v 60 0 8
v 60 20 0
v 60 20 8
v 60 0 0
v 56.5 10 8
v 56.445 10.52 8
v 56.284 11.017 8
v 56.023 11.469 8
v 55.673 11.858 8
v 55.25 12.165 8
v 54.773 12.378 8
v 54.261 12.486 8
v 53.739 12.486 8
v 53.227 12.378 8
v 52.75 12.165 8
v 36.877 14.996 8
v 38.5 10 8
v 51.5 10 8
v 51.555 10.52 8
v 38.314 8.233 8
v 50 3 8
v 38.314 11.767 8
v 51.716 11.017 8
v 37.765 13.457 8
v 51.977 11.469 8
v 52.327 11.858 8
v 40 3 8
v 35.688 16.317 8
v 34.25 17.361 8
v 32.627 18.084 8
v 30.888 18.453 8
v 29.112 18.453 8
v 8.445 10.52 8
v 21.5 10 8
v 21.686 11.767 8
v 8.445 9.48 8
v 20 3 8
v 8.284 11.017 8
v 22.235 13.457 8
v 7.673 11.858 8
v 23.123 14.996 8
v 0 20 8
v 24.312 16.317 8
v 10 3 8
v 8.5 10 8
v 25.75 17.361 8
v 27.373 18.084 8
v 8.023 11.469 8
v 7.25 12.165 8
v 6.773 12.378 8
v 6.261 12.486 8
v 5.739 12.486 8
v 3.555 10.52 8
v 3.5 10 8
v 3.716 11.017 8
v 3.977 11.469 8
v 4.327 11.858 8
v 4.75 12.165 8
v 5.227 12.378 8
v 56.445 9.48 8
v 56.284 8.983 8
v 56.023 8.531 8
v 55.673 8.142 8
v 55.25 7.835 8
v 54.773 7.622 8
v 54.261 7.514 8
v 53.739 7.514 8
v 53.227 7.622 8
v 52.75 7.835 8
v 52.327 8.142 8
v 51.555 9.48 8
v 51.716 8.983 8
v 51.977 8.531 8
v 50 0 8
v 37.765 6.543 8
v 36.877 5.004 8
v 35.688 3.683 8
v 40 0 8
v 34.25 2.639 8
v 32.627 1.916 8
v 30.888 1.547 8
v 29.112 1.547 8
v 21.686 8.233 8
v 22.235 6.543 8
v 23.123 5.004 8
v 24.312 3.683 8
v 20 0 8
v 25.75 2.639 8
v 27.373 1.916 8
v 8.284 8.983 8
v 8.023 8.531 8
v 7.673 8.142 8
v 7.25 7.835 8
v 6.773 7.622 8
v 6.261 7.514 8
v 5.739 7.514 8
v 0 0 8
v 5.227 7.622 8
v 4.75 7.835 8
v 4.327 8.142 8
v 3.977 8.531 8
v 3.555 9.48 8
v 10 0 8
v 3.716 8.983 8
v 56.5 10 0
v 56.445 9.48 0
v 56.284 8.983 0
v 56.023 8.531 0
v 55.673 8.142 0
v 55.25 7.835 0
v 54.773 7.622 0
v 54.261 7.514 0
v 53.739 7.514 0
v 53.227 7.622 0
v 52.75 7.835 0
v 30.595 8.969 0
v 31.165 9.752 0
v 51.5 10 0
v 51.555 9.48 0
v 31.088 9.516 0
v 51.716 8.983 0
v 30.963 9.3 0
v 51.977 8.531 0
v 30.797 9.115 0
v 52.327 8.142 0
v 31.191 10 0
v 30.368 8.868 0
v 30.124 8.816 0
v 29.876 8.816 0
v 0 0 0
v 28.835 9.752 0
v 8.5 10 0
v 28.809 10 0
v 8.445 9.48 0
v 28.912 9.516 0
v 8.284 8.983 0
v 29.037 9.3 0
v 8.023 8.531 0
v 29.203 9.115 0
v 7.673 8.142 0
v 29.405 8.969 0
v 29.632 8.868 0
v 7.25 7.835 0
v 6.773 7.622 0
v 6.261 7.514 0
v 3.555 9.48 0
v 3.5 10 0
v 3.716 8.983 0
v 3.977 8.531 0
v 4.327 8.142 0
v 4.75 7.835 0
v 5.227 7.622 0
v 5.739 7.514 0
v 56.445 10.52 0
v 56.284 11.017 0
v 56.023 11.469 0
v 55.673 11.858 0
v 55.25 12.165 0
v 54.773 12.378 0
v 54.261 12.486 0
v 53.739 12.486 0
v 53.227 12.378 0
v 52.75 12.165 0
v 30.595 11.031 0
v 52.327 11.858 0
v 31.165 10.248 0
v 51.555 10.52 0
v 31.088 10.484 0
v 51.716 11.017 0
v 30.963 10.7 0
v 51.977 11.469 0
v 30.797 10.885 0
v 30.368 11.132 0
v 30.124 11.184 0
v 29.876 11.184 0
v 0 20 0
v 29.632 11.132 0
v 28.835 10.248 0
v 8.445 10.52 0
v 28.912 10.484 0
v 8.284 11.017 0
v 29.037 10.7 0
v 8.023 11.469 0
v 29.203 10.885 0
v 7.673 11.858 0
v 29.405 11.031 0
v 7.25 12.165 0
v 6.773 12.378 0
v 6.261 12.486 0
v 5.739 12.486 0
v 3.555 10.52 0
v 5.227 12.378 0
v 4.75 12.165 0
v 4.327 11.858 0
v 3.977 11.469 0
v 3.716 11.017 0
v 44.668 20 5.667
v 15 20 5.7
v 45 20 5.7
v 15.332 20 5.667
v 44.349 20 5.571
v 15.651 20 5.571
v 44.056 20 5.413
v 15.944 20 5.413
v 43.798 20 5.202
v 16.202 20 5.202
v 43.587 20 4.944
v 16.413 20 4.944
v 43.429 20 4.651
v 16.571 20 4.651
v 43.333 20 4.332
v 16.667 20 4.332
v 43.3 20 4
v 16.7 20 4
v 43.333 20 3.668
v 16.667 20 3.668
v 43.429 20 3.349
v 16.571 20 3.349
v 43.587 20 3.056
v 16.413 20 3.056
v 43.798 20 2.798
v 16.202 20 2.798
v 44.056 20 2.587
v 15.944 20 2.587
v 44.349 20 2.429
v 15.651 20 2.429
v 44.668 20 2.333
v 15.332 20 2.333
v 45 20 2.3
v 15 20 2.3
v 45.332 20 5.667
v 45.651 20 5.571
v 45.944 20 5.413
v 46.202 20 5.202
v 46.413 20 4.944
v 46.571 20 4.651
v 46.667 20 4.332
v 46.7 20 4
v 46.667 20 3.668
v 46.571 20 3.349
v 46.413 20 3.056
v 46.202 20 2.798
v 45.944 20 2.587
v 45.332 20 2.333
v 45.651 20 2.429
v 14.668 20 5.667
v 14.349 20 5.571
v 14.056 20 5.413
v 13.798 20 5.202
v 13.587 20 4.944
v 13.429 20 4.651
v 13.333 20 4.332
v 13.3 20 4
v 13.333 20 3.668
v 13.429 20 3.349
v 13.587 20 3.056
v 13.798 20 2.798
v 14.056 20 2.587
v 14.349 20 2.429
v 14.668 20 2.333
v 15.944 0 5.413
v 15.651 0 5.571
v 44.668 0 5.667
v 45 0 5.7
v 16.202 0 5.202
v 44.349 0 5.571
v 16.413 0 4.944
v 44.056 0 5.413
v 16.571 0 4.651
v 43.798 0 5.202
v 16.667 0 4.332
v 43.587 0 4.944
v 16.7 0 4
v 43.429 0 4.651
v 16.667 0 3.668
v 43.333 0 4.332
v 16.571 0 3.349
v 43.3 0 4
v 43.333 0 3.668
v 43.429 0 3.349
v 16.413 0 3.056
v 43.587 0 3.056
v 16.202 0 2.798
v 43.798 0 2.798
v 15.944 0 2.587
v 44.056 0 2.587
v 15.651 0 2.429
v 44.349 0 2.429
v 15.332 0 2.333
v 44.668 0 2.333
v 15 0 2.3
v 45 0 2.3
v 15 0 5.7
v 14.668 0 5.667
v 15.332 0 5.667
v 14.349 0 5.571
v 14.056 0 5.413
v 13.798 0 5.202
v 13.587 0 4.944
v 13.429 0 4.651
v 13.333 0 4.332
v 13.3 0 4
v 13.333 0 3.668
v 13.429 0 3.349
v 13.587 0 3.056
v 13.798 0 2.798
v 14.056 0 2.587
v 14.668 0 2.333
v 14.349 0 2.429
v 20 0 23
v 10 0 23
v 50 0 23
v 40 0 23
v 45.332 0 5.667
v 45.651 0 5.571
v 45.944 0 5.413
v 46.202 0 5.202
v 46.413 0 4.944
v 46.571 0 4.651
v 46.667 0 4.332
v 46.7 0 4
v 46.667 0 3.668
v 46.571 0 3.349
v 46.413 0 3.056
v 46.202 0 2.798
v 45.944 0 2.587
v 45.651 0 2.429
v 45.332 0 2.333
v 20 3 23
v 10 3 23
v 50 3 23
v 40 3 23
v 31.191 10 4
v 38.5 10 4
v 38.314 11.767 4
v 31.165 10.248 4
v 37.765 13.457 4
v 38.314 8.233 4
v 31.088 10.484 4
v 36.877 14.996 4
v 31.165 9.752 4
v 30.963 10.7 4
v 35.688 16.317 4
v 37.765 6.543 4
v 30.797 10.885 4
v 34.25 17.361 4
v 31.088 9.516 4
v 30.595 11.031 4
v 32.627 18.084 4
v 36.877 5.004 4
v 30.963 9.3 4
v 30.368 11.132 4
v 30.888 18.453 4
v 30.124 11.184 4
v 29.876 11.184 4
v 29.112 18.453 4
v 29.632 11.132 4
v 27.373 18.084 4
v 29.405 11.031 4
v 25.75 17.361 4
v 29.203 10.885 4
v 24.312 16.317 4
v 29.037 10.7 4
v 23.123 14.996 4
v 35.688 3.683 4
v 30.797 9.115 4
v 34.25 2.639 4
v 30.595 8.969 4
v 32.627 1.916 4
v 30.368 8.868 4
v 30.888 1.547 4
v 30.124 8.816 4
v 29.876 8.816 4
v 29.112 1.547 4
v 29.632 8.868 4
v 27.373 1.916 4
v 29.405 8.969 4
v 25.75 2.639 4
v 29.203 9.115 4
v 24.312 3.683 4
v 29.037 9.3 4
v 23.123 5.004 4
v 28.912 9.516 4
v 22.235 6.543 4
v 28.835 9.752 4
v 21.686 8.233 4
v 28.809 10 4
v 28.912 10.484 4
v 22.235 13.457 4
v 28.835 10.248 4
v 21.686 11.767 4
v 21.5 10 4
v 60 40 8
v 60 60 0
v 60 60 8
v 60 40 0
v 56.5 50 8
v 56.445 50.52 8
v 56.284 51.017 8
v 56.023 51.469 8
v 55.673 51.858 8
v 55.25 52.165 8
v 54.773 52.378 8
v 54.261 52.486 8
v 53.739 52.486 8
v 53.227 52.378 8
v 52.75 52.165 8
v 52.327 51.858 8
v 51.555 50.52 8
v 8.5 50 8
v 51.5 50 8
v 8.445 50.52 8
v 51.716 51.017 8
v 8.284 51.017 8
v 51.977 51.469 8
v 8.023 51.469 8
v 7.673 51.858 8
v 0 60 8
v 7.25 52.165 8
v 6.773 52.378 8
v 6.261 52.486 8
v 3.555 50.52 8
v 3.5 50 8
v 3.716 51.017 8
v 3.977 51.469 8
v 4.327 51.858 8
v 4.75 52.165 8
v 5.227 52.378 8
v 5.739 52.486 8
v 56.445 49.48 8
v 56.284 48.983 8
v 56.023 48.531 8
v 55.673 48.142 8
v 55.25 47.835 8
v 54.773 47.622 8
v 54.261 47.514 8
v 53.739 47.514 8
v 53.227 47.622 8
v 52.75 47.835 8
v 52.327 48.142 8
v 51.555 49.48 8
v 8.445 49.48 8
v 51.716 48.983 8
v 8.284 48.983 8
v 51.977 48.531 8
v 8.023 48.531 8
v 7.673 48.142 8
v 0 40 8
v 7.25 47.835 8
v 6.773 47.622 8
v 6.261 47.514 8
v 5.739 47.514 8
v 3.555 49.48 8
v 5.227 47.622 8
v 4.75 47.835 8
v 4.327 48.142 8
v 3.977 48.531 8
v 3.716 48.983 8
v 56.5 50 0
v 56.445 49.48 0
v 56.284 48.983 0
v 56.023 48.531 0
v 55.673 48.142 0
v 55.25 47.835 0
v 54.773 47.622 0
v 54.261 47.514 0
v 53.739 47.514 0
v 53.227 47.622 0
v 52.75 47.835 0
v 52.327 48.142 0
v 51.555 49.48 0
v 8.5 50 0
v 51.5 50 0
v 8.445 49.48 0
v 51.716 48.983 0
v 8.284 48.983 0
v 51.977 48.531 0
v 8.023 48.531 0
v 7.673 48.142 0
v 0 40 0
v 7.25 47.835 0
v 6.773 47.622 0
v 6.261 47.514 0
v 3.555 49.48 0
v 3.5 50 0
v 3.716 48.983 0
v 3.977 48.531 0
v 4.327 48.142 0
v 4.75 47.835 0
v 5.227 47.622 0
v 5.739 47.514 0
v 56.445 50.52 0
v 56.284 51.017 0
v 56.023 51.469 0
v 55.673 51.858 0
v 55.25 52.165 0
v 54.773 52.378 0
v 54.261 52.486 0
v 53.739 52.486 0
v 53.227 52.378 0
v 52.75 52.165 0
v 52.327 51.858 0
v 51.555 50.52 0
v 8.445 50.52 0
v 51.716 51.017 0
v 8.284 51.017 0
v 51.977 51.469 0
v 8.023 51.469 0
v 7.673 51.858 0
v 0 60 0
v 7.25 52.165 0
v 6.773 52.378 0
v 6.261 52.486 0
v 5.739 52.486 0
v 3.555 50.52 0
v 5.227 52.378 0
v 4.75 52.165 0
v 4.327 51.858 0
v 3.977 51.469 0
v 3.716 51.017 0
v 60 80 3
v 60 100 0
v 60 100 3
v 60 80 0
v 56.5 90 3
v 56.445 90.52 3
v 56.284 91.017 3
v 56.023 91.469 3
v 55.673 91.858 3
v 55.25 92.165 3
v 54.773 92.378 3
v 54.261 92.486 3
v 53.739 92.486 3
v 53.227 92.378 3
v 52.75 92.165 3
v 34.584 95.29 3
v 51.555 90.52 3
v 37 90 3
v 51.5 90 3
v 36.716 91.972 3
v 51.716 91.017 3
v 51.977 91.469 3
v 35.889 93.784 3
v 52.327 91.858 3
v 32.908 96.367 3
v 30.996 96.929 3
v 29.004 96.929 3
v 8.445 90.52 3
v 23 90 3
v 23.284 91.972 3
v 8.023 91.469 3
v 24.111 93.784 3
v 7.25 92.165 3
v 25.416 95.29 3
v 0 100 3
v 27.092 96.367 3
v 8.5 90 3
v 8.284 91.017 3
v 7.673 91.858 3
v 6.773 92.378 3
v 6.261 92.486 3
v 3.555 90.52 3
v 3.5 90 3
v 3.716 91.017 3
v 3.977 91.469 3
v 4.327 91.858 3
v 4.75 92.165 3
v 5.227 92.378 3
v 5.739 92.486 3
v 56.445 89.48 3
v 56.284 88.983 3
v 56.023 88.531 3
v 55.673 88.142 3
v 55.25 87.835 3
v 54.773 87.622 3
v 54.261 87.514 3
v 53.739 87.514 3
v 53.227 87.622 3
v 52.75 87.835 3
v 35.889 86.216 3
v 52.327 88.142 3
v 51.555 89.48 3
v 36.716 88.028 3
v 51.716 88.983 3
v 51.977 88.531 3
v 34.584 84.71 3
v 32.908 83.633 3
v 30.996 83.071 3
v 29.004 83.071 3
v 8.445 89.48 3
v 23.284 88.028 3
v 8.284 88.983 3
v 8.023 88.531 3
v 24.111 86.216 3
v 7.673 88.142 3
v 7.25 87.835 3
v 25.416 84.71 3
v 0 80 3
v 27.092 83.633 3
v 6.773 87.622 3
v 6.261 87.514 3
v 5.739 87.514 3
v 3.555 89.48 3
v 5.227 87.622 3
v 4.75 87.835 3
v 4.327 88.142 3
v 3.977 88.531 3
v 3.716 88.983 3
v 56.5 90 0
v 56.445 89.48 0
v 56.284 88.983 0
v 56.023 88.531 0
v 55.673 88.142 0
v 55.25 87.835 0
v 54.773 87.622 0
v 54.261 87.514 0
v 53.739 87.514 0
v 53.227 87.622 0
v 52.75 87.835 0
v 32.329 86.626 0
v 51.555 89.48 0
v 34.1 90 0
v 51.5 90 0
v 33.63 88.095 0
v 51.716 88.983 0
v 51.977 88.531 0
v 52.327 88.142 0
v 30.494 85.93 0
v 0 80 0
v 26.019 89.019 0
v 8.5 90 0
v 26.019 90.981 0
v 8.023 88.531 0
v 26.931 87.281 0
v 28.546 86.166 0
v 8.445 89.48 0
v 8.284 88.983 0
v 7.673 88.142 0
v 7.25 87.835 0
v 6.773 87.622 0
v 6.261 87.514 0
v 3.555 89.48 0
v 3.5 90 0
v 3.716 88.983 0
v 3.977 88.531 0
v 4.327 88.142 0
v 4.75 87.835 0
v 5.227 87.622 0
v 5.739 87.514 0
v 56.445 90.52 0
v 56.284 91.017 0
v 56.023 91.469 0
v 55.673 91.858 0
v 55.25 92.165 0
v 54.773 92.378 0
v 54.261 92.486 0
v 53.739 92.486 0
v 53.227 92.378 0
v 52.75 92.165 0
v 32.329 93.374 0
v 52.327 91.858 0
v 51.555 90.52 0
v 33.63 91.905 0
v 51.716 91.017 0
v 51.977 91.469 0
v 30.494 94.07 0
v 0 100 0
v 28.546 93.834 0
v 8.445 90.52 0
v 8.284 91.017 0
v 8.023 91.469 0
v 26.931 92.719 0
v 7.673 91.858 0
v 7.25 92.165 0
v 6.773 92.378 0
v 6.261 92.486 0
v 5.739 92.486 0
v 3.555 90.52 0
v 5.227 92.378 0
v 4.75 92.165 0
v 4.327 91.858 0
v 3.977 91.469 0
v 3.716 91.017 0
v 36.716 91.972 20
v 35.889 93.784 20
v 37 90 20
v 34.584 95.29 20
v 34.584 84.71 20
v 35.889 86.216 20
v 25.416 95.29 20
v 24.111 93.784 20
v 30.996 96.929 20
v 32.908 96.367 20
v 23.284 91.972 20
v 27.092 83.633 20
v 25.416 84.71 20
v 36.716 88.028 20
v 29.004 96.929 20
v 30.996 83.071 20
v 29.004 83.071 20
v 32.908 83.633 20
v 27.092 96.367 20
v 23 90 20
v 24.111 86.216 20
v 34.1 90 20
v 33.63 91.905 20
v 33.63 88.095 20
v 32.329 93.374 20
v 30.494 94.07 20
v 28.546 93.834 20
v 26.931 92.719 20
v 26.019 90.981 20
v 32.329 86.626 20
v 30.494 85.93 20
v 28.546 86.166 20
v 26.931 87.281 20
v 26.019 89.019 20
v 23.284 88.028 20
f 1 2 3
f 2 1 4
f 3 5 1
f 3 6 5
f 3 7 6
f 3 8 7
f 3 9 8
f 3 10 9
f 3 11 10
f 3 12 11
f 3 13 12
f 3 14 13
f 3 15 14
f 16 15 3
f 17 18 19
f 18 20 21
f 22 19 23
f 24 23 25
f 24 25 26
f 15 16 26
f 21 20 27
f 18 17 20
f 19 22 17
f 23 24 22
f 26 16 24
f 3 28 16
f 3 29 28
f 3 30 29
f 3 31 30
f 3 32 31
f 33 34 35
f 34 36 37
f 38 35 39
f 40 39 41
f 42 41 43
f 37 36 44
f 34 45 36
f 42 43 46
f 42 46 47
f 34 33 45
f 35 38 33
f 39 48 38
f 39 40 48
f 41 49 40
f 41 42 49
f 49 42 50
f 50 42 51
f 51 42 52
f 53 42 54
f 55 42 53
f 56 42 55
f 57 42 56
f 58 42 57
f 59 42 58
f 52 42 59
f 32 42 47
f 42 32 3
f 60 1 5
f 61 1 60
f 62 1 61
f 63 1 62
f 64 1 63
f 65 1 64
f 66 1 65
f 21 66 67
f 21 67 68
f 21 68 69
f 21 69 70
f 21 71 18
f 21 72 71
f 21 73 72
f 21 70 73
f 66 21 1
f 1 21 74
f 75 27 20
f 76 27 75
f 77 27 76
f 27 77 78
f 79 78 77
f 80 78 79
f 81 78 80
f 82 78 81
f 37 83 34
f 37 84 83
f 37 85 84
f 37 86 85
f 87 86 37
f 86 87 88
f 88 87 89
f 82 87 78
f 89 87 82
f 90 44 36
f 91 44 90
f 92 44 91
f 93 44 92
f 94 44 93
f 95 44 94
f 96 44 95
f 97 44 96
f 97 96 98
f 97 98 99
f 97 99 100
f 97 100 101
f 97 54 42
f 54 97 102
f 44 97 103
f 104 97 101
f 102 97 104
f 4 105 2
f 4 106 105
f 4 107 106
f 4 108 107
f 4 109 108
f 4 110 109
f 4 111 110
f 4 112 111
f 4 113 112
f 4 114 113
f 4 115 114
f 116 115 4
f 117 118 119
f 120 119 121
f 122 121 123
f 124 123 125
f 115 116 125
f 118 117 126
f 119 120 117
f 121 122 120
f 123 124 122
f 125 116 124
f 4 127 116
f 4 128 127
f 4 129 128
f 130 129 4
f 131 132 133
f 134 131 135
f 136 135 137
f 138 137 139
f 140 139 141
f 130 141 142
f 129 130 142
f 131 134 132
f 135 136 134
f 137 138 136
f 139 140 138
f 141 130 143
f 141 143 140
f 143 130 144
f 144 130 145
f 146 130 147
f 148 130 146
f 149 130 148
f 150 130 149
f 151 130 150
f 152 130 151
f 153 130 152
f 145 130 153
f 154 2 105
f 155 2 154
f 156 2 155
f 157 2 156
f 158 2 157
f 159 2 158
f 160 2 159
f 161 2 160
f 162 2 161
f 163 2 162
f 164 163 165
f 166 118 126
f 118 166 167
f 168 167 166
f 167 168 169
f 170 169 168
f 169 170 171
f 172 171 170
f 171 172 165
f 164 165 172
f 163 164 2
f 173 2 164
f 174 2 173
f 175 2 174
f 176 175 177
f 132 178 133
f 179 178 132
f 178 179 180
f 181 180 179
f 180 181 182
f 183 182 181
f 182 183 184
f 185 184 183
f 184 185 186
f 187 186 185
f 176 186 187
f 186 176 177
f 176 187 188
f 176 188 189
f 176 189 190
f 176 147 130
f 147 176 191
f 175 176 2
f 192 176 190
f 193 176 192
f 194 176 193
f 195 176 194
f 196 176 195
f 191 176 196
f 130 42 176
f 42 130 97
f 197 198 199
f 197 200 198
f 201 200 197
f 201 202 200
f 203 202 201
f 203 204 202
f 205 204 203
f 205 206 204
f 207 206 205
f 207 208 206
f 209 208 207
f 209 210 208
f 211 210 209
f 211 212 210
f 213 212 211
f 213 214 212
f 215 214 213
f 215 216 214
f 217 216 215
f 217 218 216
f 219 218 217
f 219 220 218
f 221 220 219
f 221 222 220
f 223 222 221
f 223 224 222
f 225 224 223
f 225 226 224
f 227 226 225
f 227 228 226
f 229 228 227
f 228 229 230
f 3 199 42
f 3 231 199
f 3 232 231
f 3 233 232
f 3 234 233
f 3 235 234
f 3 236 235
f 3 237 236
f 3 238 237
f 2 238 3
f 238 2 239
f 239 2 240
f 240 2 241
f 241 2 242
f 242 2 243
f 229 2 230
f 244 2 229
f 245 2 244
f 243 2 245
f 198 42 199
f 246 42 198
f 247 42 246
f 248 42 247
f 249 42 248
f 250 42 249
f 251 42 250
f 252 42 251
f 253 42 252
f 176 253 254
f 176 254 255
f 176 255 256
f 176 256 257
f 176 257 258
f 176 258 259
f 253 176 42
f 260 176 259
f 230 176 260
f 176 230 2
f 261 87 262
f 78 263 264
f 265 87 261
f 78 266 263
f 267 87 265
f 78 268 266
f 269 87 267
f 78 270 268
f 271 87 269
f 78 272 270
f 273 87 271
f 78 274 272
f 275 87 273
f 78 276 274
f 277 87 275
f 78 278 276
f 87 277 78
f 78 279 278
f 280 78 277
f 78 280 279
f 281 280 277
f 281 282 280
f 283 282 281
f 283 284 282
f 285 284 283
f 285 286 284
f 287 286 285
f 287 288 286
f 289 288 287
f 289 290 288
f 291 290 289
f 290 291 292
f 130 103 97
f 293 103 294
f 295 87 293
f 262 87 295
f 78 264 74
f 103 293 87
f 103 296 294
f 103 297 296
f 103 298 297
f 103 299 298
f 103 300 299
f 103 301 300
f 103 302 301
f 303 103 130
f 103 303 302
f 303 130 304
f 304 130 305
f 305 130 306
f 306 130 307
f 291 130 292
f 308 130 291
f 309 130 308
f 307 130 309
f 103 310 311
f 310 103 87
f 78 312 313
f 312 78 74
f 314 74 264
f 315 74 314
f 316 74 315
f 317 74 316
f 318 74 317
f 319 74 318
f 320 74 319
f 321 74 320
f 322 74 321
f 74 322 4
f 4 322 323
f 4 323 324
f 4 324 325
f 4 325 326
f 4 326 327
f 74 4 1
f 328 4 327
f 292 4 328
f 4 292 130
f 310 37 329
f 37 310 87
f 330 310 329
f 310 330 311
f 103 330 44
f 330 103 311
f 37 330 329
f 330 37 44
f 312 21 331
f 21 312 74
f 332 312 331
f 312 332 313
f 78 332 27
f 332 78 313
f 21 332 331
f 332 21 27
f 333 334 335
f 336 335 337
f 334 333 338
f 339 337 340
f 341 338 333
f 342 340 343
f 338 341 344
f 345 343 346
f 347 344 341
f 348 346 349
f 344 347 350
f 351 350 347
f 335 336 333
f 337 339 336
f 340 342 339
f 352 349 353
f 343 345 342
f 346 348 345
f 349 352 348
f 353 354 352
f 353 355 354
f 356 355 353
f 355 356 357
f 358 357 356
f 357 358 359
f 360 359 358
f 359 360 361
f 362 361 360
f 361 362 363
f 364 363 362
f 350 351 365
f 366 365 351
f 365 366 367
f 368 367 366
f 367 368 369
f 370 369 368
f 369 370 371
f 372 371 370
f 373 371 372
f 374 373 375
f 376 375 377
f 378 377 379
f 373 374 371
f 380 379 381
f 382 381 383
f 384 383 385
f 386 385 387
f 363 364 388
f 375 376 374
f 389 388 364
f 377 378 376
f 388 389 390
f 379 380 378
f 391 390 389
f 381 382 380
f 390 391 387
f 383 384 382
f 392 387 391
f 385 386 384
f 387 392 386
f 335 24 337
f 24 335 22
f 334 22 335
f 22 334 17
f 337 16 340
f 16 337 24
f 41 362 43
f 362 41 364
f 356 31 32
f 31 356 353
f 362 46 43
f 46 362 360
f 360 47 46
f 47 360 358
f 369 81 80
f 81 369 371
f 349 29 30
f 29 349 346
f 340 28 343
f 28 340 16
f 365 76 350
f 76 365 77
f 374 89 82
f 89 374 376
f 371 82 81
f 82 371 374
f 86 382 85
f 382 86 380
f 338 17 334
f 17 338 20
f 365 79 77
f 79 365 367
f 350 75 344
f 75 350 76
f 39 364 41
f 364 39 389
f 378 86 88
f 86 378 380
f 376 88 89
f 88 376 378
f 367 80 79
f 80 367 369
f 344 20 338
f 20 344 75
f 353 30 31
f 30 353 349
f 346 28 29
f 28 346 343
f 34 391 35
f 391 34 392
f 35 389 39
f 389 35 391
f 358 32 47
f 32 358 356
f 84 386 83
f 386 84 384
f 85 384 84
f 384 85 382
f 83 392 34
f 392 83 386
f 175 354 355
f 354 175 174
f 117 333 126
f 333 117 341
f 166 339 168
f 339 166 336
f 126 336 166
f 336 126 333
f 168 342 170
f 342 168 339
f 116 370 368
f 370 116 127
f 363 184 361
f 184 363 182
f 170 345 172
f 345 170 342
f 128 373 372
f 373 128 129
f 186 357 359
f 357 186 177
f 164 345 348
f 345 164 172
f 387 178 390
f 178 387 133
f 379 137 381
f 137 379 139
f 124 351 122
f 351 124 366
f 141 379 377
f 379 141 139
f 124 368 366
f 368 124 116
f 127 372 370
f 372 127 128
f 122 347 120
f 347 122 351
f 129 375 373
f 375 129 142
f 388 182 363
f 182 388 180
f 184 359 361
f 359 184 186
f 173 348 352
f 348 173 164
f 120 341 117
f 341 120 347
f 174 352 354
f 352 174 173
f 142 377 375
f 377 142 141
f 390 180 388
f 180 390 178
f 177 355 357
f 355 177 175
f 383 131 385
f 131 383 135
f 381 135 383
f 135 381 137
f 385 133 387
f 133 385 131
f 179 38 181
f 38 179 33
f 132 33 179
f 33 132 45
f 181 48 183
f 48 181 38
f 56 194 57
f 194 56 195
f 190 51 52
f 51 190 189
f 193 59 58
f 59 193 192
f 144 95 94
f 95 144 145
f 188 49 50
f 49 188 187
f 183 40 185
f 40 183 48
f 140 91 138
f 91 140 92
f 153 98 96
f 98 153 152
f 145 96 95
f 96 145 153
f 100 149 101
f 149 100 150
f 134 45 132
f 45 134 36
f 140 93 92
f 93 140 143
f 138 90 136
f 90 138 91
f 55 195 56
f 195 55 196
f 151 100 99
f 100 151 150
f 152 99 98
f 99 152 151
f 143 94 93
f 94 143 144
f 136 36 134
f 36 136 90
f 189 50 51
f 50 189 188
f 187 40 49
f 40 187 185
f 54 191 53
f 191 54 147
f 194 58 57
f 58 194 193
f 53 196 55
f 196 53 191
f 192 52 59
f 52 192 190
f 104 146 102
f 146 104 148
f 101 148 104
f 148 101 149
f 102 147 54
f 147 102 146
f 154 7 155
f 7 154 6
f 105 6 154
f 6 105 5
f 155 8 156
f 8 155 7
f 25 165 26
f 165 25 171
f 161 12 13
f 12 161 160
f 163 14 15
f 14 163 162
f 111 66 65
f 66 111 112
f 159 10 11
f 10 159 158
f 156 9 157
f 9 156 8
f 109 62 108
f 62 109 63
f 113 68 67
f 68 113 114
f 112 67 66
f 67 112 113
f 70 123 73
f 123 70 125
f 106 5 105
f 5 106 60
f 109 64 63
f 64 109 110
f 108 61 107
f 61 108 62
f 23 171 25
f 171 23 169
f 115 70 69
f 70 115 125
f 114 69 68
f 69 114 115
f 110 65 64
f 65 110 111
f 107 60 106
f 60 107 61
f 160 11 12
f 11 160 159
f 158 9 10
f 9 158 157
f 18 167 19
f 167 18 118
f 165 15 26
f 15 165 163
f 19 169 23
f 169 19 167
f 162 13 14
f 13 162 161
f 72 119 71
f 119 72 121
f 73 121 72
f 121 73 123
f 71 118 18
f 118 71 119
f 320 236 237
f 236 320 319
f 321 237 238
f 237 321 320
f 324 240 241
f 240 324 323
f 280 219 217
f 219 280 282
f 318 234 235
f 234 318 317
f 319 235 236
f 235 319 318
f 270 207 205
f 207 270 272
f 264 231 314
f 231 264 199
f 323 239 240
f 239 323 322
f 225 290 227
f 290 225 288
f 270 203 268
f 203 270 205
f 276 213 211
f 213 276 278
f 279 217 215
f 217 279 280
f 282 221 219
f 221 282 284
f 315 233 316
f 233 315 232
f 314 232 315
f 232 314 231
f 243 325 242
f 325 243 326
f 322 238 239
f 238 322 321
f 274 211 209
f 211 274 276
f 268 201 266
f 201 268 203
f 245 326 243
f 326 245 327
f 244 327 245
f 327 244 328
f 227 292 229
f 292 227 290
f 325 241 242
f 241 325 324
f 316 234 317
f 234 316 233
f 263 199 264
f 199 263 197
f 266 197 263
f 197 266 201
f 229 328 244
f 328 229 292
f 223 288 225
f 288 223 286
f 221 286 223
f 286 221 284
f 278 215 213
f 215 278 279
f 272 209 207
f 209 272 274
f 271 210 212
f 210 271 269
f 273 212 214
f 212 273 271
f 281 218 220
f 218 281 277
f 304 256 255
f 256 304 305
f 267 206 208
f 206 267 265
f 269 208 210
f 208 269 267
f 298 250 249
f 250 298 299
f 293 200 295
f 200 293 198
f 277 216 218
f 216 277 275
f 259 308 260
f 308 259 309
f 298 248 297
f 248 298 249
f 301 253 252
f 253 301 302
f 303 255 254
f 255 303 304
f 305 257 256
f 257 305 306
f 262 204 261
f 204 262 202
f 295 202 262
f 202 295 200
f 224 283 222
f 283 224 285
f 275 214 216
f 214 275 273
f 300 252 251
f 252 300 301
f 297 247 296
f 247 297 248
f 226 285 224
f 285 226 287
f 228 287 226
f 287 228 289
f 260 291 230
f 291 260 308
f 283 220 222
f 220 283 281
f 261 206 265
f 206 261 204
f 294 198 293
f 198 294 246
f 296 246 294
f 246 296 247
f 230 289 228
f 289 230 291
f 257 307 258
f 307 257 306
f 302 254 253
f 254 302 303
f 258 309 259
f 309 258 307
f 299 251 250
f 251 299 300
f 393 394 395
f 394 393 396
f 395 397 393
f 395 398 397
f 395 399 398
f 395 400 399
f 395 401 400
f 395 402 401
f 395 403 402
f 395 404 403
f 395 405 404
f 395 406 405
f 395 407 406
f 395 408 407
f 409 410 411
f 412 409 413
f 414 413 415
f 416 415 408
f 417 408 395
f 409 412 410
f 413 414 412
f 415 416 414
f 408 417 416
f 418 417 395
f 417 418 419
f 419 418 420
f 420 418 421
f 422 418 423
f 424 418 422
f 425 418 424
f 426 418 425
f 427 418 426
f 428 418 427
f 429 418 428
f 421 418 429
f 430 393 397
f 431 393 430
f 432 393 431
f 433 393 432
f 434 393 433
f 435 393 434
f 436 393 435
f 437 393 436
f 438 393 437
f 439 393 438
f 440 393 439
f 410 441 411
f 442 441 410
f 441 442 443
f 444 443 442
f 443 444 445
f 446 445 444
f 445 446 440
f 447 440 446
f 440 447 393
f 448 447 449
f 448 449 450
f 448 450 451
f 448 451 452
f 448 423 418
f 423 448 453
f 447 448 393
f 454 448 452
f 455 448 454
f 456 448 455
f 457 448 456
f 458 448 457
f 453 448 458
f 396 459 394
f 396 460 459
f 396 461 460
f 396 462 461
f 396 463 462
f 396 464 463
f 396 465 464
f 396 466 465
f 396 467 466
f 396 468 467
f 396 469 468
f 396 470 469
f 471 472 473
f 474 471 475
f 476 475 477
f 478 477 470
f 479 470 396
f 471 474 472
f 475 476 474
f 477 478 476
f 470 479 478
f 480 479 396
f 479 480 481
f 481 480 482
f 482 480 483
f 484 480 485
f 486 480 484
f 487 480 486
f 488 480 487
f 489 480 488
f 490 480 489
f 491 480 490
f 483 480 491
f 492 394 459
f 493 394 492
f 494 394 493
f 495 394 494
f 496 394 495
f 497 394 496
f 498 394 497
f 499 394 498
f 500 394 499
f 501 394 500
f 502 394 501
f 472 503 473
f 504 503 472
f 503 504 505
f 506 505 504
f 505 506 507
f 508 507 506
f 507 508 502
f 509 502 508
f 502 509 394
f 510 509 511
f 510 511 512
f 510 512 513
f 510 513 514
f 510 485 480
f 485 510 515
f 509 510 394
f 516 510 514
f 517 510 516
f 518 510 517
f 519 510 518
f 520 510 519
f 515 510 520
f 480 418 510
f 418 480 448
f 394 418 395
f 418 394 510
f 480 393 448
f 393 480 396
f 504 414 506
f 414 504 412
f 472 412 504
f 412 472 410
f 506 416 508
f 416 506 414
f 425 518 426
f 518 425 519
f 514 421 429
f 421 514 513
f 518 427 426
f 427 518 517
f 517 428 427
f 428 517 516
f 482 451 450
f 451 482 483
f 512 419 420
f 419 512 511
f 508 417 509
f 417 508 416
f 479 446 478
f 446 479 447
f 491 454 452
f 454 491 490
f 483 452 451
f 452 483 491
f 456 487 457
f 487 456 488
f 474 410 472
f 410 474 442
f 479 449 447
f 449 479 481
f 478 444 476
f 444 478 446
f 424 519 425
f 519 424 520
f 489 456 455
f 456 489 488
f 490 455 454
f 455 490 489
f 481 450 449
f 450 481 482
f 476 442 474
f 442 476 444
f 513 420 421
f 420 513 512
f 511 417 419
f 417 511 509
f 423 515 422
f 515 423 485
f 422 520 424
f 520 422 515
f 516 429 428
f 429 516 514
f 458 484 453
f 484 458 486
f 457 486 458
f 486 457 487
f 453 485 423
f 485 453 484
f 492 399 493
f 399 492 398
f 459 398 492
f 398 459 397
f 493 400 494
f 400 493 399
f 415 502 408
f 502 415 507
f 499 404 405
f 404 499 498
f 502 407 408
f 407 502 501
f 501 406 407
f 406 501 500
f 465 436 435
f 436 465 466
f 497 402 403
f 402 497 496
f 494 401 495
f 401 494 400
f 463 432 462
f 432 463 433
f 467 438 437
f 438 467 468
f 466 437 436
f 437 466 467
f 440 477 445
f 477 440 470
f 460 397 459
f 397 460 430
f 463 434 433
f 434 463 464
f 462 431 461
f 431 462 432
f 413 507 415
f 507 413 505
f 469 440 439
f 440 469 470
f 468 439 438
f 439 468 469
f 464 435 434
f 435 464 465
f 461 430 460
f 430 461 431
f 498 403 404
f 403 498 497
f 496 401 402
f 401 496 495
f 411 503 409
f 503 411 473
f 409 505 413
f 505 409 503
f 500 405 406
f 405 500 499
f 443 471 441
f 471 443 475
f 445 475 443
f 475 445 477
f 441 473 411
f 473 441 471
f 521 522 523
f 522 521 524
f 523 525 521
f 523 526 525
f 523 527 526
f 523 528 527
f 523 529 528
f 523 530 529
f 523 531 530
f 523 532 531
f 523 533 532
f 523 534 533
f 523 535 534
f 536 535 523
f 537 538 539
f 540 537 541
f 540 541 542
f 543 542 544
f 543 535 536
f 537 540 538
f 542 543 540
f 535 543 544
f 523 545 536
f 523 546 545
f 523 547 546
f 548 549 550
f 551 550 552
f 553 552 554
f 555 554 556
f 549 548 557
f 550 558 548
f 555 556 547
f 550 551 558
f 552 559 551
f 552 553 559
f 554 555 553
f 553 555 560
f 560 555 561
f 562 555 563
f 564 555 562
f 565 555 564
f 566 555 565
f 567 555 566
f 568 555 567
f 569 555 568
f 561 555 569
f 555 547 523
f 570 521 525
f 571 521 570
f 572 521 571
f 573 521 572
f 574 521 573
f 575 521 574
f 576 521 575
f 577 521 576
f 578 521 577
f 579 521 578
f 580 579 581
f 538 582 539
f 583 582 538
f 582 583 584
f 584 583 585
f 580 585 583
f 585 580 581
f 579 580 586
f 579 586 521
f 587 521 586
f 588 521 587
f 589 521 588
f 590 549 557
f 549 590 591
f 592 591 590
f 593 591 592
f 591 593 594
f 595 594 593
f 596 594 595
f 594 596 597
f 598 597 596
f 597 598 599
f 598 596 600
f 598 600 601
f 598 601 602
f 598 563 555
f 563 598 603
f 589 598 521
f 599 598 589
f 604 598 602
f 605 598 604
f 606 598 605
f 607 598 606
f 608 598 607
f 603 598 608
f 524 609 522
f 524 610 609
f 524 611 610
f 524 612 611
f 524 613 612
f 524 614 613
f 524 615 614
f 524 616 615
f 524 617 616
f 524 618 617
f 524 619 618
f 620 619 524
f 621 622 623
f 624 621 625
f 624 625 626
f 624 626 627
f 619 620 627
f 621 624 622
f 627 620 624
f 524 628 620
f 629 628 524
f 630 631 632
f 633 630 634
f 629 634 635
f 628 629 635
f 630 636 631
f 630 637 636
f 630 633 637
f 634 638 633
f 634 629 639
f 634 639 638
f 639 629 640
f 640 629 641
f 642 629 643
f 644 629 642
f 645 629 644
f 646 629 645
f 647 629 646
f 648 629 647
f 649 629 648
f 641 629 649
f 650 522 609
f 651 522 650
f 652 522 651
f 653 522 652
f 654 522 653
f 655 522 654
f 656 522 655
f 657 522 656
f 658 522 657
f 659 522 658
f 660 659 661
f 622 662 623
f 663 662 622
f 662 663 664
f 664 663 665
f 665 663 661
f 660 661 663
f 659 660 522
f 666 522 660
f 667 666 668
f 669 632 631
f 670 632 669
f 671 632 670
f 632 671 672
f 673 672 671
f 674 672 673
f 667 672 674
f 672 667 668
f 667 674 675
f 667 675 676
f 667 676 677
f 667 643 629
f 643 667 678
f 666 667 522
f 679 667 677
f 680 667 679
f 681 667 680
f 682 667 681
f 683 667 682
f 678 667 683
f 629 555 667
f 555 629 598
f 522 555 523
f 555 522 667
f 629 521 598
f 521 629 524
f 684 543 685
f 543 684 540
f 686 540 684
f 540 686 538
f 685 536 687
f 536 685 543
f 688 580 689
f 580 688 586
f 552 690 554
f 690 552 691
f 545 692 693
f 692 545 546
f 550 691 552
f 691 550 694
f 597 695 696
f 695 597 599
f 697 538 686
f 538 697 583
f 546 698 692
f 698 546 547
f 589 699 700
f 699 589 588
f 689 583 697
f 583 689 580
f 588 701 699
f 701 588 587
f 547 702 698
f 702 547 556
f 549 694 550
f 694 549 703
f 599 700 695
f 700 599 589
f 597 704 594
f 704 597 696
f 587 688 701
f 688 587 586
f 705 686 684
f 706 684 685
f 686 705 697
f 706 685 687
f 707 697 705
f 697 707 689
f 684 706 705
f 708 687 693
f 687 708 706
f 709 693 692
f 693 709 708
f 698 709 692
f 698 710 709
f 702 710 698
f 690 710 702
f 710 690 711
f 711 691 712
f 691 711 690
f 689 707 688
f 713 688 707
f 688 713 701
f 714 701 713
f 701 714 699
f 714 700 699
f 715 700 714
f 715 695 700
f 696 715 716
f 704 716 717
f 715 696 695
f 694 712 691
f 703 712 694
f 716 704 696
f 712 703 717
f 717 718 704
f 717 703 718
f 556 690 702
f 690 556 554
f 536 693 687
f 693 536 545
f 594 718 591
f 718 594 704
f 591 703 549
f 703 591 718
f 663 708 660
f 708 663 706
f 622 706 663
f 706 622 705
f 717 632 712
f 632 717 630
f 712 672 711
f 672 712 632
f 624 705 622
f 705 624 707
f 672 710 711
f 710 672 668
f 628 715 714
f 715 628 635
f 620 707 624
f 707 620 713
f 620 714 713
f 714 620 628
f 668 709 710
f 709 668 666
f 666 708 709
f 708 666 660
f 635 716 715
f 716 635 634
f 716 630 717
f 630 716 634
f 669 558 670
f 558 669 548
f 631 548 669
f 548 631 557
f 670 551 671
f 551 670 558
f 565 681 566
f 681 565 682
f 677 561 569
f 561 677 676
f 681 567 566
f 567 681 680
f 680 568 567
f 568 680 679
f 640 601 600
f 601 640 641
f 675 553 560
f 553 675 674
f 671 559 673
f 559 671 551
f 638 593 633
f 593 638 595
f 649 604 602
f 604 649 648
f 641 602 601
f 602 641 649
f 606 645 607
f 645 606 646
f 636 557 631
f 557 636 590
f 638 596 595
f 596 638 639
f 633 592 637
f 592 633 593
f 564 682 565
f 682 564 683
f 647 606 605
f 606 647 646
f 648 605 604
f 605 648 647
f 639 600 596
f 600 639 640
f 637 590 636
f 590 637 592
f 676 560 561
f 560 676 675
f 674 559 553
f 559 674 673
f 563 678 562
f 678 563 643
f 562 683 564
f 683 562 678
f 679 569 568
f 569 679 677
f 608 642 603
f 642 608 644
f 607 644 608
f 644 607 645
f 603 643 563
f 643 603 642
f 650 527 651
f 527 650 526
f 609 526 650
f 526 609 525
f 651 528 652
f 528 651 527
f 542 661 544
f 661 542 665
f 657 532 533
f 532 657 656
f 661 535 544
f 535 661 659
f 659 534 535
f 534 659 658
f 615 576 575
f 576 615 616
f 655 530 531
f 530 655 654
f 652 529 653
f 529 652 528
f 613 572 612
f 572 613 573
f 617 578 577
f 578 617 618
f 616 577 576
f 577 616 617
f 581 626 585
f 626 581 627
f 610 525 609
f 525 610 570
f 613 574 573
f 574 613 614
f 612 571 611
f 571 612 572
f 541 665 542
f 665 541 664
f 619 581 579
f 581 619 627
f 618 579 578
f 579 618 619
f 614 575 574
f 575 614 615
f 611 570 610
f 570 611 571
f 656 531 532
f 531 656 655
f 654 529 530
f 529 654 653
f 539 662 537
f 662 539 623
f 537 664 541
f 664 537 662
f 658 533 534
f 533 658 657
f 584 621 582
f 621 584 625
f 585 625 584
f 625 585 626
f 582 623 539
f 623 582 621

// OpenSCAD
// RebeliX
//
// j-head mount + fan 40mm
// GNU GPL v3
// Martin Neruda
// http://www.reprap4u.cz

fan_width = 40;
fan_diameter = 38;
fan_mount = 33;

mount_height = 8;

filament_diameter=2;
filament_feed_hole_d=(filament_diameter*1.1)/cos(180/8);

difference(){
	union(){
	  cube([60,20,mount_height]);
	  translate([10,0,8]) cube([10,3,15]);
	  translate([40,0,8]) cube([10,3,15]);
	}	
	
	translate([30,10,4]) cylinder(r=8.5,h=6,$fn=30);
	translate([30,10,-2]) cylinder(r=filament_feed_hole_d/2,h=20,$fn=30);


	// Otvory pro prisroubovani
	translate([30-24,10,-0.1]) cylinder(r=2.5,h=10,$fn=30);
	translate([30+24,10,-0.1]) cylinder(r=2.5,h=10,$fn=30);

  translate([30+15,24,4]) rotate([90,0,0]) cylinder(r=1.7, h=30, $fn=32);
  translate([30-15,24,4]) rotate([90,0,0]) cylinder(r=1.7, h=30, $fn=32);
	
}	



translate([0,40,0])
difference(){
	union(){
	  cube([60,20,mount_height]);
	}	
	
	//translate([30,10,4]) cylinder(r=8.5,h=6,$fn=30);
	//translate([30,10,-2]) cylinder(r=filament_feed_hole_d/2,h=20,$fn=30);


	// Otvory pro prisroubovani
	translate([30-24,10,-0.1]) cylinder(r=2.5,h=10,$fn=30);
	translate([30+24,10,-0.1]) cylinder(r=2.5,h=10,$fn=30);
	
}	


translate([0,80,0])
difference(){
	union(){
	  cube([60,20,3]);
        translate([30,10,0]) cylinder(20,7,7);
	}	
	
	//translate([30,10,4]) cylinder(r=8.5,h=6,$fn=30);
	//translate([30,10,-2]) cylinder(r=filament_feed_hole_d/2,h=20,$fn=30);
translate([30,10,0]) cylinder(50,4.1,4.1);

	// Otvory pro prisroubovani
	translate([30-24,10,-0.1]) cylinder(r=2.5,h=10,$fn=30);
	translate([30+24,10,-0.1]) cylinder(r=2.5,h=10,$fn=30);
	
}	
